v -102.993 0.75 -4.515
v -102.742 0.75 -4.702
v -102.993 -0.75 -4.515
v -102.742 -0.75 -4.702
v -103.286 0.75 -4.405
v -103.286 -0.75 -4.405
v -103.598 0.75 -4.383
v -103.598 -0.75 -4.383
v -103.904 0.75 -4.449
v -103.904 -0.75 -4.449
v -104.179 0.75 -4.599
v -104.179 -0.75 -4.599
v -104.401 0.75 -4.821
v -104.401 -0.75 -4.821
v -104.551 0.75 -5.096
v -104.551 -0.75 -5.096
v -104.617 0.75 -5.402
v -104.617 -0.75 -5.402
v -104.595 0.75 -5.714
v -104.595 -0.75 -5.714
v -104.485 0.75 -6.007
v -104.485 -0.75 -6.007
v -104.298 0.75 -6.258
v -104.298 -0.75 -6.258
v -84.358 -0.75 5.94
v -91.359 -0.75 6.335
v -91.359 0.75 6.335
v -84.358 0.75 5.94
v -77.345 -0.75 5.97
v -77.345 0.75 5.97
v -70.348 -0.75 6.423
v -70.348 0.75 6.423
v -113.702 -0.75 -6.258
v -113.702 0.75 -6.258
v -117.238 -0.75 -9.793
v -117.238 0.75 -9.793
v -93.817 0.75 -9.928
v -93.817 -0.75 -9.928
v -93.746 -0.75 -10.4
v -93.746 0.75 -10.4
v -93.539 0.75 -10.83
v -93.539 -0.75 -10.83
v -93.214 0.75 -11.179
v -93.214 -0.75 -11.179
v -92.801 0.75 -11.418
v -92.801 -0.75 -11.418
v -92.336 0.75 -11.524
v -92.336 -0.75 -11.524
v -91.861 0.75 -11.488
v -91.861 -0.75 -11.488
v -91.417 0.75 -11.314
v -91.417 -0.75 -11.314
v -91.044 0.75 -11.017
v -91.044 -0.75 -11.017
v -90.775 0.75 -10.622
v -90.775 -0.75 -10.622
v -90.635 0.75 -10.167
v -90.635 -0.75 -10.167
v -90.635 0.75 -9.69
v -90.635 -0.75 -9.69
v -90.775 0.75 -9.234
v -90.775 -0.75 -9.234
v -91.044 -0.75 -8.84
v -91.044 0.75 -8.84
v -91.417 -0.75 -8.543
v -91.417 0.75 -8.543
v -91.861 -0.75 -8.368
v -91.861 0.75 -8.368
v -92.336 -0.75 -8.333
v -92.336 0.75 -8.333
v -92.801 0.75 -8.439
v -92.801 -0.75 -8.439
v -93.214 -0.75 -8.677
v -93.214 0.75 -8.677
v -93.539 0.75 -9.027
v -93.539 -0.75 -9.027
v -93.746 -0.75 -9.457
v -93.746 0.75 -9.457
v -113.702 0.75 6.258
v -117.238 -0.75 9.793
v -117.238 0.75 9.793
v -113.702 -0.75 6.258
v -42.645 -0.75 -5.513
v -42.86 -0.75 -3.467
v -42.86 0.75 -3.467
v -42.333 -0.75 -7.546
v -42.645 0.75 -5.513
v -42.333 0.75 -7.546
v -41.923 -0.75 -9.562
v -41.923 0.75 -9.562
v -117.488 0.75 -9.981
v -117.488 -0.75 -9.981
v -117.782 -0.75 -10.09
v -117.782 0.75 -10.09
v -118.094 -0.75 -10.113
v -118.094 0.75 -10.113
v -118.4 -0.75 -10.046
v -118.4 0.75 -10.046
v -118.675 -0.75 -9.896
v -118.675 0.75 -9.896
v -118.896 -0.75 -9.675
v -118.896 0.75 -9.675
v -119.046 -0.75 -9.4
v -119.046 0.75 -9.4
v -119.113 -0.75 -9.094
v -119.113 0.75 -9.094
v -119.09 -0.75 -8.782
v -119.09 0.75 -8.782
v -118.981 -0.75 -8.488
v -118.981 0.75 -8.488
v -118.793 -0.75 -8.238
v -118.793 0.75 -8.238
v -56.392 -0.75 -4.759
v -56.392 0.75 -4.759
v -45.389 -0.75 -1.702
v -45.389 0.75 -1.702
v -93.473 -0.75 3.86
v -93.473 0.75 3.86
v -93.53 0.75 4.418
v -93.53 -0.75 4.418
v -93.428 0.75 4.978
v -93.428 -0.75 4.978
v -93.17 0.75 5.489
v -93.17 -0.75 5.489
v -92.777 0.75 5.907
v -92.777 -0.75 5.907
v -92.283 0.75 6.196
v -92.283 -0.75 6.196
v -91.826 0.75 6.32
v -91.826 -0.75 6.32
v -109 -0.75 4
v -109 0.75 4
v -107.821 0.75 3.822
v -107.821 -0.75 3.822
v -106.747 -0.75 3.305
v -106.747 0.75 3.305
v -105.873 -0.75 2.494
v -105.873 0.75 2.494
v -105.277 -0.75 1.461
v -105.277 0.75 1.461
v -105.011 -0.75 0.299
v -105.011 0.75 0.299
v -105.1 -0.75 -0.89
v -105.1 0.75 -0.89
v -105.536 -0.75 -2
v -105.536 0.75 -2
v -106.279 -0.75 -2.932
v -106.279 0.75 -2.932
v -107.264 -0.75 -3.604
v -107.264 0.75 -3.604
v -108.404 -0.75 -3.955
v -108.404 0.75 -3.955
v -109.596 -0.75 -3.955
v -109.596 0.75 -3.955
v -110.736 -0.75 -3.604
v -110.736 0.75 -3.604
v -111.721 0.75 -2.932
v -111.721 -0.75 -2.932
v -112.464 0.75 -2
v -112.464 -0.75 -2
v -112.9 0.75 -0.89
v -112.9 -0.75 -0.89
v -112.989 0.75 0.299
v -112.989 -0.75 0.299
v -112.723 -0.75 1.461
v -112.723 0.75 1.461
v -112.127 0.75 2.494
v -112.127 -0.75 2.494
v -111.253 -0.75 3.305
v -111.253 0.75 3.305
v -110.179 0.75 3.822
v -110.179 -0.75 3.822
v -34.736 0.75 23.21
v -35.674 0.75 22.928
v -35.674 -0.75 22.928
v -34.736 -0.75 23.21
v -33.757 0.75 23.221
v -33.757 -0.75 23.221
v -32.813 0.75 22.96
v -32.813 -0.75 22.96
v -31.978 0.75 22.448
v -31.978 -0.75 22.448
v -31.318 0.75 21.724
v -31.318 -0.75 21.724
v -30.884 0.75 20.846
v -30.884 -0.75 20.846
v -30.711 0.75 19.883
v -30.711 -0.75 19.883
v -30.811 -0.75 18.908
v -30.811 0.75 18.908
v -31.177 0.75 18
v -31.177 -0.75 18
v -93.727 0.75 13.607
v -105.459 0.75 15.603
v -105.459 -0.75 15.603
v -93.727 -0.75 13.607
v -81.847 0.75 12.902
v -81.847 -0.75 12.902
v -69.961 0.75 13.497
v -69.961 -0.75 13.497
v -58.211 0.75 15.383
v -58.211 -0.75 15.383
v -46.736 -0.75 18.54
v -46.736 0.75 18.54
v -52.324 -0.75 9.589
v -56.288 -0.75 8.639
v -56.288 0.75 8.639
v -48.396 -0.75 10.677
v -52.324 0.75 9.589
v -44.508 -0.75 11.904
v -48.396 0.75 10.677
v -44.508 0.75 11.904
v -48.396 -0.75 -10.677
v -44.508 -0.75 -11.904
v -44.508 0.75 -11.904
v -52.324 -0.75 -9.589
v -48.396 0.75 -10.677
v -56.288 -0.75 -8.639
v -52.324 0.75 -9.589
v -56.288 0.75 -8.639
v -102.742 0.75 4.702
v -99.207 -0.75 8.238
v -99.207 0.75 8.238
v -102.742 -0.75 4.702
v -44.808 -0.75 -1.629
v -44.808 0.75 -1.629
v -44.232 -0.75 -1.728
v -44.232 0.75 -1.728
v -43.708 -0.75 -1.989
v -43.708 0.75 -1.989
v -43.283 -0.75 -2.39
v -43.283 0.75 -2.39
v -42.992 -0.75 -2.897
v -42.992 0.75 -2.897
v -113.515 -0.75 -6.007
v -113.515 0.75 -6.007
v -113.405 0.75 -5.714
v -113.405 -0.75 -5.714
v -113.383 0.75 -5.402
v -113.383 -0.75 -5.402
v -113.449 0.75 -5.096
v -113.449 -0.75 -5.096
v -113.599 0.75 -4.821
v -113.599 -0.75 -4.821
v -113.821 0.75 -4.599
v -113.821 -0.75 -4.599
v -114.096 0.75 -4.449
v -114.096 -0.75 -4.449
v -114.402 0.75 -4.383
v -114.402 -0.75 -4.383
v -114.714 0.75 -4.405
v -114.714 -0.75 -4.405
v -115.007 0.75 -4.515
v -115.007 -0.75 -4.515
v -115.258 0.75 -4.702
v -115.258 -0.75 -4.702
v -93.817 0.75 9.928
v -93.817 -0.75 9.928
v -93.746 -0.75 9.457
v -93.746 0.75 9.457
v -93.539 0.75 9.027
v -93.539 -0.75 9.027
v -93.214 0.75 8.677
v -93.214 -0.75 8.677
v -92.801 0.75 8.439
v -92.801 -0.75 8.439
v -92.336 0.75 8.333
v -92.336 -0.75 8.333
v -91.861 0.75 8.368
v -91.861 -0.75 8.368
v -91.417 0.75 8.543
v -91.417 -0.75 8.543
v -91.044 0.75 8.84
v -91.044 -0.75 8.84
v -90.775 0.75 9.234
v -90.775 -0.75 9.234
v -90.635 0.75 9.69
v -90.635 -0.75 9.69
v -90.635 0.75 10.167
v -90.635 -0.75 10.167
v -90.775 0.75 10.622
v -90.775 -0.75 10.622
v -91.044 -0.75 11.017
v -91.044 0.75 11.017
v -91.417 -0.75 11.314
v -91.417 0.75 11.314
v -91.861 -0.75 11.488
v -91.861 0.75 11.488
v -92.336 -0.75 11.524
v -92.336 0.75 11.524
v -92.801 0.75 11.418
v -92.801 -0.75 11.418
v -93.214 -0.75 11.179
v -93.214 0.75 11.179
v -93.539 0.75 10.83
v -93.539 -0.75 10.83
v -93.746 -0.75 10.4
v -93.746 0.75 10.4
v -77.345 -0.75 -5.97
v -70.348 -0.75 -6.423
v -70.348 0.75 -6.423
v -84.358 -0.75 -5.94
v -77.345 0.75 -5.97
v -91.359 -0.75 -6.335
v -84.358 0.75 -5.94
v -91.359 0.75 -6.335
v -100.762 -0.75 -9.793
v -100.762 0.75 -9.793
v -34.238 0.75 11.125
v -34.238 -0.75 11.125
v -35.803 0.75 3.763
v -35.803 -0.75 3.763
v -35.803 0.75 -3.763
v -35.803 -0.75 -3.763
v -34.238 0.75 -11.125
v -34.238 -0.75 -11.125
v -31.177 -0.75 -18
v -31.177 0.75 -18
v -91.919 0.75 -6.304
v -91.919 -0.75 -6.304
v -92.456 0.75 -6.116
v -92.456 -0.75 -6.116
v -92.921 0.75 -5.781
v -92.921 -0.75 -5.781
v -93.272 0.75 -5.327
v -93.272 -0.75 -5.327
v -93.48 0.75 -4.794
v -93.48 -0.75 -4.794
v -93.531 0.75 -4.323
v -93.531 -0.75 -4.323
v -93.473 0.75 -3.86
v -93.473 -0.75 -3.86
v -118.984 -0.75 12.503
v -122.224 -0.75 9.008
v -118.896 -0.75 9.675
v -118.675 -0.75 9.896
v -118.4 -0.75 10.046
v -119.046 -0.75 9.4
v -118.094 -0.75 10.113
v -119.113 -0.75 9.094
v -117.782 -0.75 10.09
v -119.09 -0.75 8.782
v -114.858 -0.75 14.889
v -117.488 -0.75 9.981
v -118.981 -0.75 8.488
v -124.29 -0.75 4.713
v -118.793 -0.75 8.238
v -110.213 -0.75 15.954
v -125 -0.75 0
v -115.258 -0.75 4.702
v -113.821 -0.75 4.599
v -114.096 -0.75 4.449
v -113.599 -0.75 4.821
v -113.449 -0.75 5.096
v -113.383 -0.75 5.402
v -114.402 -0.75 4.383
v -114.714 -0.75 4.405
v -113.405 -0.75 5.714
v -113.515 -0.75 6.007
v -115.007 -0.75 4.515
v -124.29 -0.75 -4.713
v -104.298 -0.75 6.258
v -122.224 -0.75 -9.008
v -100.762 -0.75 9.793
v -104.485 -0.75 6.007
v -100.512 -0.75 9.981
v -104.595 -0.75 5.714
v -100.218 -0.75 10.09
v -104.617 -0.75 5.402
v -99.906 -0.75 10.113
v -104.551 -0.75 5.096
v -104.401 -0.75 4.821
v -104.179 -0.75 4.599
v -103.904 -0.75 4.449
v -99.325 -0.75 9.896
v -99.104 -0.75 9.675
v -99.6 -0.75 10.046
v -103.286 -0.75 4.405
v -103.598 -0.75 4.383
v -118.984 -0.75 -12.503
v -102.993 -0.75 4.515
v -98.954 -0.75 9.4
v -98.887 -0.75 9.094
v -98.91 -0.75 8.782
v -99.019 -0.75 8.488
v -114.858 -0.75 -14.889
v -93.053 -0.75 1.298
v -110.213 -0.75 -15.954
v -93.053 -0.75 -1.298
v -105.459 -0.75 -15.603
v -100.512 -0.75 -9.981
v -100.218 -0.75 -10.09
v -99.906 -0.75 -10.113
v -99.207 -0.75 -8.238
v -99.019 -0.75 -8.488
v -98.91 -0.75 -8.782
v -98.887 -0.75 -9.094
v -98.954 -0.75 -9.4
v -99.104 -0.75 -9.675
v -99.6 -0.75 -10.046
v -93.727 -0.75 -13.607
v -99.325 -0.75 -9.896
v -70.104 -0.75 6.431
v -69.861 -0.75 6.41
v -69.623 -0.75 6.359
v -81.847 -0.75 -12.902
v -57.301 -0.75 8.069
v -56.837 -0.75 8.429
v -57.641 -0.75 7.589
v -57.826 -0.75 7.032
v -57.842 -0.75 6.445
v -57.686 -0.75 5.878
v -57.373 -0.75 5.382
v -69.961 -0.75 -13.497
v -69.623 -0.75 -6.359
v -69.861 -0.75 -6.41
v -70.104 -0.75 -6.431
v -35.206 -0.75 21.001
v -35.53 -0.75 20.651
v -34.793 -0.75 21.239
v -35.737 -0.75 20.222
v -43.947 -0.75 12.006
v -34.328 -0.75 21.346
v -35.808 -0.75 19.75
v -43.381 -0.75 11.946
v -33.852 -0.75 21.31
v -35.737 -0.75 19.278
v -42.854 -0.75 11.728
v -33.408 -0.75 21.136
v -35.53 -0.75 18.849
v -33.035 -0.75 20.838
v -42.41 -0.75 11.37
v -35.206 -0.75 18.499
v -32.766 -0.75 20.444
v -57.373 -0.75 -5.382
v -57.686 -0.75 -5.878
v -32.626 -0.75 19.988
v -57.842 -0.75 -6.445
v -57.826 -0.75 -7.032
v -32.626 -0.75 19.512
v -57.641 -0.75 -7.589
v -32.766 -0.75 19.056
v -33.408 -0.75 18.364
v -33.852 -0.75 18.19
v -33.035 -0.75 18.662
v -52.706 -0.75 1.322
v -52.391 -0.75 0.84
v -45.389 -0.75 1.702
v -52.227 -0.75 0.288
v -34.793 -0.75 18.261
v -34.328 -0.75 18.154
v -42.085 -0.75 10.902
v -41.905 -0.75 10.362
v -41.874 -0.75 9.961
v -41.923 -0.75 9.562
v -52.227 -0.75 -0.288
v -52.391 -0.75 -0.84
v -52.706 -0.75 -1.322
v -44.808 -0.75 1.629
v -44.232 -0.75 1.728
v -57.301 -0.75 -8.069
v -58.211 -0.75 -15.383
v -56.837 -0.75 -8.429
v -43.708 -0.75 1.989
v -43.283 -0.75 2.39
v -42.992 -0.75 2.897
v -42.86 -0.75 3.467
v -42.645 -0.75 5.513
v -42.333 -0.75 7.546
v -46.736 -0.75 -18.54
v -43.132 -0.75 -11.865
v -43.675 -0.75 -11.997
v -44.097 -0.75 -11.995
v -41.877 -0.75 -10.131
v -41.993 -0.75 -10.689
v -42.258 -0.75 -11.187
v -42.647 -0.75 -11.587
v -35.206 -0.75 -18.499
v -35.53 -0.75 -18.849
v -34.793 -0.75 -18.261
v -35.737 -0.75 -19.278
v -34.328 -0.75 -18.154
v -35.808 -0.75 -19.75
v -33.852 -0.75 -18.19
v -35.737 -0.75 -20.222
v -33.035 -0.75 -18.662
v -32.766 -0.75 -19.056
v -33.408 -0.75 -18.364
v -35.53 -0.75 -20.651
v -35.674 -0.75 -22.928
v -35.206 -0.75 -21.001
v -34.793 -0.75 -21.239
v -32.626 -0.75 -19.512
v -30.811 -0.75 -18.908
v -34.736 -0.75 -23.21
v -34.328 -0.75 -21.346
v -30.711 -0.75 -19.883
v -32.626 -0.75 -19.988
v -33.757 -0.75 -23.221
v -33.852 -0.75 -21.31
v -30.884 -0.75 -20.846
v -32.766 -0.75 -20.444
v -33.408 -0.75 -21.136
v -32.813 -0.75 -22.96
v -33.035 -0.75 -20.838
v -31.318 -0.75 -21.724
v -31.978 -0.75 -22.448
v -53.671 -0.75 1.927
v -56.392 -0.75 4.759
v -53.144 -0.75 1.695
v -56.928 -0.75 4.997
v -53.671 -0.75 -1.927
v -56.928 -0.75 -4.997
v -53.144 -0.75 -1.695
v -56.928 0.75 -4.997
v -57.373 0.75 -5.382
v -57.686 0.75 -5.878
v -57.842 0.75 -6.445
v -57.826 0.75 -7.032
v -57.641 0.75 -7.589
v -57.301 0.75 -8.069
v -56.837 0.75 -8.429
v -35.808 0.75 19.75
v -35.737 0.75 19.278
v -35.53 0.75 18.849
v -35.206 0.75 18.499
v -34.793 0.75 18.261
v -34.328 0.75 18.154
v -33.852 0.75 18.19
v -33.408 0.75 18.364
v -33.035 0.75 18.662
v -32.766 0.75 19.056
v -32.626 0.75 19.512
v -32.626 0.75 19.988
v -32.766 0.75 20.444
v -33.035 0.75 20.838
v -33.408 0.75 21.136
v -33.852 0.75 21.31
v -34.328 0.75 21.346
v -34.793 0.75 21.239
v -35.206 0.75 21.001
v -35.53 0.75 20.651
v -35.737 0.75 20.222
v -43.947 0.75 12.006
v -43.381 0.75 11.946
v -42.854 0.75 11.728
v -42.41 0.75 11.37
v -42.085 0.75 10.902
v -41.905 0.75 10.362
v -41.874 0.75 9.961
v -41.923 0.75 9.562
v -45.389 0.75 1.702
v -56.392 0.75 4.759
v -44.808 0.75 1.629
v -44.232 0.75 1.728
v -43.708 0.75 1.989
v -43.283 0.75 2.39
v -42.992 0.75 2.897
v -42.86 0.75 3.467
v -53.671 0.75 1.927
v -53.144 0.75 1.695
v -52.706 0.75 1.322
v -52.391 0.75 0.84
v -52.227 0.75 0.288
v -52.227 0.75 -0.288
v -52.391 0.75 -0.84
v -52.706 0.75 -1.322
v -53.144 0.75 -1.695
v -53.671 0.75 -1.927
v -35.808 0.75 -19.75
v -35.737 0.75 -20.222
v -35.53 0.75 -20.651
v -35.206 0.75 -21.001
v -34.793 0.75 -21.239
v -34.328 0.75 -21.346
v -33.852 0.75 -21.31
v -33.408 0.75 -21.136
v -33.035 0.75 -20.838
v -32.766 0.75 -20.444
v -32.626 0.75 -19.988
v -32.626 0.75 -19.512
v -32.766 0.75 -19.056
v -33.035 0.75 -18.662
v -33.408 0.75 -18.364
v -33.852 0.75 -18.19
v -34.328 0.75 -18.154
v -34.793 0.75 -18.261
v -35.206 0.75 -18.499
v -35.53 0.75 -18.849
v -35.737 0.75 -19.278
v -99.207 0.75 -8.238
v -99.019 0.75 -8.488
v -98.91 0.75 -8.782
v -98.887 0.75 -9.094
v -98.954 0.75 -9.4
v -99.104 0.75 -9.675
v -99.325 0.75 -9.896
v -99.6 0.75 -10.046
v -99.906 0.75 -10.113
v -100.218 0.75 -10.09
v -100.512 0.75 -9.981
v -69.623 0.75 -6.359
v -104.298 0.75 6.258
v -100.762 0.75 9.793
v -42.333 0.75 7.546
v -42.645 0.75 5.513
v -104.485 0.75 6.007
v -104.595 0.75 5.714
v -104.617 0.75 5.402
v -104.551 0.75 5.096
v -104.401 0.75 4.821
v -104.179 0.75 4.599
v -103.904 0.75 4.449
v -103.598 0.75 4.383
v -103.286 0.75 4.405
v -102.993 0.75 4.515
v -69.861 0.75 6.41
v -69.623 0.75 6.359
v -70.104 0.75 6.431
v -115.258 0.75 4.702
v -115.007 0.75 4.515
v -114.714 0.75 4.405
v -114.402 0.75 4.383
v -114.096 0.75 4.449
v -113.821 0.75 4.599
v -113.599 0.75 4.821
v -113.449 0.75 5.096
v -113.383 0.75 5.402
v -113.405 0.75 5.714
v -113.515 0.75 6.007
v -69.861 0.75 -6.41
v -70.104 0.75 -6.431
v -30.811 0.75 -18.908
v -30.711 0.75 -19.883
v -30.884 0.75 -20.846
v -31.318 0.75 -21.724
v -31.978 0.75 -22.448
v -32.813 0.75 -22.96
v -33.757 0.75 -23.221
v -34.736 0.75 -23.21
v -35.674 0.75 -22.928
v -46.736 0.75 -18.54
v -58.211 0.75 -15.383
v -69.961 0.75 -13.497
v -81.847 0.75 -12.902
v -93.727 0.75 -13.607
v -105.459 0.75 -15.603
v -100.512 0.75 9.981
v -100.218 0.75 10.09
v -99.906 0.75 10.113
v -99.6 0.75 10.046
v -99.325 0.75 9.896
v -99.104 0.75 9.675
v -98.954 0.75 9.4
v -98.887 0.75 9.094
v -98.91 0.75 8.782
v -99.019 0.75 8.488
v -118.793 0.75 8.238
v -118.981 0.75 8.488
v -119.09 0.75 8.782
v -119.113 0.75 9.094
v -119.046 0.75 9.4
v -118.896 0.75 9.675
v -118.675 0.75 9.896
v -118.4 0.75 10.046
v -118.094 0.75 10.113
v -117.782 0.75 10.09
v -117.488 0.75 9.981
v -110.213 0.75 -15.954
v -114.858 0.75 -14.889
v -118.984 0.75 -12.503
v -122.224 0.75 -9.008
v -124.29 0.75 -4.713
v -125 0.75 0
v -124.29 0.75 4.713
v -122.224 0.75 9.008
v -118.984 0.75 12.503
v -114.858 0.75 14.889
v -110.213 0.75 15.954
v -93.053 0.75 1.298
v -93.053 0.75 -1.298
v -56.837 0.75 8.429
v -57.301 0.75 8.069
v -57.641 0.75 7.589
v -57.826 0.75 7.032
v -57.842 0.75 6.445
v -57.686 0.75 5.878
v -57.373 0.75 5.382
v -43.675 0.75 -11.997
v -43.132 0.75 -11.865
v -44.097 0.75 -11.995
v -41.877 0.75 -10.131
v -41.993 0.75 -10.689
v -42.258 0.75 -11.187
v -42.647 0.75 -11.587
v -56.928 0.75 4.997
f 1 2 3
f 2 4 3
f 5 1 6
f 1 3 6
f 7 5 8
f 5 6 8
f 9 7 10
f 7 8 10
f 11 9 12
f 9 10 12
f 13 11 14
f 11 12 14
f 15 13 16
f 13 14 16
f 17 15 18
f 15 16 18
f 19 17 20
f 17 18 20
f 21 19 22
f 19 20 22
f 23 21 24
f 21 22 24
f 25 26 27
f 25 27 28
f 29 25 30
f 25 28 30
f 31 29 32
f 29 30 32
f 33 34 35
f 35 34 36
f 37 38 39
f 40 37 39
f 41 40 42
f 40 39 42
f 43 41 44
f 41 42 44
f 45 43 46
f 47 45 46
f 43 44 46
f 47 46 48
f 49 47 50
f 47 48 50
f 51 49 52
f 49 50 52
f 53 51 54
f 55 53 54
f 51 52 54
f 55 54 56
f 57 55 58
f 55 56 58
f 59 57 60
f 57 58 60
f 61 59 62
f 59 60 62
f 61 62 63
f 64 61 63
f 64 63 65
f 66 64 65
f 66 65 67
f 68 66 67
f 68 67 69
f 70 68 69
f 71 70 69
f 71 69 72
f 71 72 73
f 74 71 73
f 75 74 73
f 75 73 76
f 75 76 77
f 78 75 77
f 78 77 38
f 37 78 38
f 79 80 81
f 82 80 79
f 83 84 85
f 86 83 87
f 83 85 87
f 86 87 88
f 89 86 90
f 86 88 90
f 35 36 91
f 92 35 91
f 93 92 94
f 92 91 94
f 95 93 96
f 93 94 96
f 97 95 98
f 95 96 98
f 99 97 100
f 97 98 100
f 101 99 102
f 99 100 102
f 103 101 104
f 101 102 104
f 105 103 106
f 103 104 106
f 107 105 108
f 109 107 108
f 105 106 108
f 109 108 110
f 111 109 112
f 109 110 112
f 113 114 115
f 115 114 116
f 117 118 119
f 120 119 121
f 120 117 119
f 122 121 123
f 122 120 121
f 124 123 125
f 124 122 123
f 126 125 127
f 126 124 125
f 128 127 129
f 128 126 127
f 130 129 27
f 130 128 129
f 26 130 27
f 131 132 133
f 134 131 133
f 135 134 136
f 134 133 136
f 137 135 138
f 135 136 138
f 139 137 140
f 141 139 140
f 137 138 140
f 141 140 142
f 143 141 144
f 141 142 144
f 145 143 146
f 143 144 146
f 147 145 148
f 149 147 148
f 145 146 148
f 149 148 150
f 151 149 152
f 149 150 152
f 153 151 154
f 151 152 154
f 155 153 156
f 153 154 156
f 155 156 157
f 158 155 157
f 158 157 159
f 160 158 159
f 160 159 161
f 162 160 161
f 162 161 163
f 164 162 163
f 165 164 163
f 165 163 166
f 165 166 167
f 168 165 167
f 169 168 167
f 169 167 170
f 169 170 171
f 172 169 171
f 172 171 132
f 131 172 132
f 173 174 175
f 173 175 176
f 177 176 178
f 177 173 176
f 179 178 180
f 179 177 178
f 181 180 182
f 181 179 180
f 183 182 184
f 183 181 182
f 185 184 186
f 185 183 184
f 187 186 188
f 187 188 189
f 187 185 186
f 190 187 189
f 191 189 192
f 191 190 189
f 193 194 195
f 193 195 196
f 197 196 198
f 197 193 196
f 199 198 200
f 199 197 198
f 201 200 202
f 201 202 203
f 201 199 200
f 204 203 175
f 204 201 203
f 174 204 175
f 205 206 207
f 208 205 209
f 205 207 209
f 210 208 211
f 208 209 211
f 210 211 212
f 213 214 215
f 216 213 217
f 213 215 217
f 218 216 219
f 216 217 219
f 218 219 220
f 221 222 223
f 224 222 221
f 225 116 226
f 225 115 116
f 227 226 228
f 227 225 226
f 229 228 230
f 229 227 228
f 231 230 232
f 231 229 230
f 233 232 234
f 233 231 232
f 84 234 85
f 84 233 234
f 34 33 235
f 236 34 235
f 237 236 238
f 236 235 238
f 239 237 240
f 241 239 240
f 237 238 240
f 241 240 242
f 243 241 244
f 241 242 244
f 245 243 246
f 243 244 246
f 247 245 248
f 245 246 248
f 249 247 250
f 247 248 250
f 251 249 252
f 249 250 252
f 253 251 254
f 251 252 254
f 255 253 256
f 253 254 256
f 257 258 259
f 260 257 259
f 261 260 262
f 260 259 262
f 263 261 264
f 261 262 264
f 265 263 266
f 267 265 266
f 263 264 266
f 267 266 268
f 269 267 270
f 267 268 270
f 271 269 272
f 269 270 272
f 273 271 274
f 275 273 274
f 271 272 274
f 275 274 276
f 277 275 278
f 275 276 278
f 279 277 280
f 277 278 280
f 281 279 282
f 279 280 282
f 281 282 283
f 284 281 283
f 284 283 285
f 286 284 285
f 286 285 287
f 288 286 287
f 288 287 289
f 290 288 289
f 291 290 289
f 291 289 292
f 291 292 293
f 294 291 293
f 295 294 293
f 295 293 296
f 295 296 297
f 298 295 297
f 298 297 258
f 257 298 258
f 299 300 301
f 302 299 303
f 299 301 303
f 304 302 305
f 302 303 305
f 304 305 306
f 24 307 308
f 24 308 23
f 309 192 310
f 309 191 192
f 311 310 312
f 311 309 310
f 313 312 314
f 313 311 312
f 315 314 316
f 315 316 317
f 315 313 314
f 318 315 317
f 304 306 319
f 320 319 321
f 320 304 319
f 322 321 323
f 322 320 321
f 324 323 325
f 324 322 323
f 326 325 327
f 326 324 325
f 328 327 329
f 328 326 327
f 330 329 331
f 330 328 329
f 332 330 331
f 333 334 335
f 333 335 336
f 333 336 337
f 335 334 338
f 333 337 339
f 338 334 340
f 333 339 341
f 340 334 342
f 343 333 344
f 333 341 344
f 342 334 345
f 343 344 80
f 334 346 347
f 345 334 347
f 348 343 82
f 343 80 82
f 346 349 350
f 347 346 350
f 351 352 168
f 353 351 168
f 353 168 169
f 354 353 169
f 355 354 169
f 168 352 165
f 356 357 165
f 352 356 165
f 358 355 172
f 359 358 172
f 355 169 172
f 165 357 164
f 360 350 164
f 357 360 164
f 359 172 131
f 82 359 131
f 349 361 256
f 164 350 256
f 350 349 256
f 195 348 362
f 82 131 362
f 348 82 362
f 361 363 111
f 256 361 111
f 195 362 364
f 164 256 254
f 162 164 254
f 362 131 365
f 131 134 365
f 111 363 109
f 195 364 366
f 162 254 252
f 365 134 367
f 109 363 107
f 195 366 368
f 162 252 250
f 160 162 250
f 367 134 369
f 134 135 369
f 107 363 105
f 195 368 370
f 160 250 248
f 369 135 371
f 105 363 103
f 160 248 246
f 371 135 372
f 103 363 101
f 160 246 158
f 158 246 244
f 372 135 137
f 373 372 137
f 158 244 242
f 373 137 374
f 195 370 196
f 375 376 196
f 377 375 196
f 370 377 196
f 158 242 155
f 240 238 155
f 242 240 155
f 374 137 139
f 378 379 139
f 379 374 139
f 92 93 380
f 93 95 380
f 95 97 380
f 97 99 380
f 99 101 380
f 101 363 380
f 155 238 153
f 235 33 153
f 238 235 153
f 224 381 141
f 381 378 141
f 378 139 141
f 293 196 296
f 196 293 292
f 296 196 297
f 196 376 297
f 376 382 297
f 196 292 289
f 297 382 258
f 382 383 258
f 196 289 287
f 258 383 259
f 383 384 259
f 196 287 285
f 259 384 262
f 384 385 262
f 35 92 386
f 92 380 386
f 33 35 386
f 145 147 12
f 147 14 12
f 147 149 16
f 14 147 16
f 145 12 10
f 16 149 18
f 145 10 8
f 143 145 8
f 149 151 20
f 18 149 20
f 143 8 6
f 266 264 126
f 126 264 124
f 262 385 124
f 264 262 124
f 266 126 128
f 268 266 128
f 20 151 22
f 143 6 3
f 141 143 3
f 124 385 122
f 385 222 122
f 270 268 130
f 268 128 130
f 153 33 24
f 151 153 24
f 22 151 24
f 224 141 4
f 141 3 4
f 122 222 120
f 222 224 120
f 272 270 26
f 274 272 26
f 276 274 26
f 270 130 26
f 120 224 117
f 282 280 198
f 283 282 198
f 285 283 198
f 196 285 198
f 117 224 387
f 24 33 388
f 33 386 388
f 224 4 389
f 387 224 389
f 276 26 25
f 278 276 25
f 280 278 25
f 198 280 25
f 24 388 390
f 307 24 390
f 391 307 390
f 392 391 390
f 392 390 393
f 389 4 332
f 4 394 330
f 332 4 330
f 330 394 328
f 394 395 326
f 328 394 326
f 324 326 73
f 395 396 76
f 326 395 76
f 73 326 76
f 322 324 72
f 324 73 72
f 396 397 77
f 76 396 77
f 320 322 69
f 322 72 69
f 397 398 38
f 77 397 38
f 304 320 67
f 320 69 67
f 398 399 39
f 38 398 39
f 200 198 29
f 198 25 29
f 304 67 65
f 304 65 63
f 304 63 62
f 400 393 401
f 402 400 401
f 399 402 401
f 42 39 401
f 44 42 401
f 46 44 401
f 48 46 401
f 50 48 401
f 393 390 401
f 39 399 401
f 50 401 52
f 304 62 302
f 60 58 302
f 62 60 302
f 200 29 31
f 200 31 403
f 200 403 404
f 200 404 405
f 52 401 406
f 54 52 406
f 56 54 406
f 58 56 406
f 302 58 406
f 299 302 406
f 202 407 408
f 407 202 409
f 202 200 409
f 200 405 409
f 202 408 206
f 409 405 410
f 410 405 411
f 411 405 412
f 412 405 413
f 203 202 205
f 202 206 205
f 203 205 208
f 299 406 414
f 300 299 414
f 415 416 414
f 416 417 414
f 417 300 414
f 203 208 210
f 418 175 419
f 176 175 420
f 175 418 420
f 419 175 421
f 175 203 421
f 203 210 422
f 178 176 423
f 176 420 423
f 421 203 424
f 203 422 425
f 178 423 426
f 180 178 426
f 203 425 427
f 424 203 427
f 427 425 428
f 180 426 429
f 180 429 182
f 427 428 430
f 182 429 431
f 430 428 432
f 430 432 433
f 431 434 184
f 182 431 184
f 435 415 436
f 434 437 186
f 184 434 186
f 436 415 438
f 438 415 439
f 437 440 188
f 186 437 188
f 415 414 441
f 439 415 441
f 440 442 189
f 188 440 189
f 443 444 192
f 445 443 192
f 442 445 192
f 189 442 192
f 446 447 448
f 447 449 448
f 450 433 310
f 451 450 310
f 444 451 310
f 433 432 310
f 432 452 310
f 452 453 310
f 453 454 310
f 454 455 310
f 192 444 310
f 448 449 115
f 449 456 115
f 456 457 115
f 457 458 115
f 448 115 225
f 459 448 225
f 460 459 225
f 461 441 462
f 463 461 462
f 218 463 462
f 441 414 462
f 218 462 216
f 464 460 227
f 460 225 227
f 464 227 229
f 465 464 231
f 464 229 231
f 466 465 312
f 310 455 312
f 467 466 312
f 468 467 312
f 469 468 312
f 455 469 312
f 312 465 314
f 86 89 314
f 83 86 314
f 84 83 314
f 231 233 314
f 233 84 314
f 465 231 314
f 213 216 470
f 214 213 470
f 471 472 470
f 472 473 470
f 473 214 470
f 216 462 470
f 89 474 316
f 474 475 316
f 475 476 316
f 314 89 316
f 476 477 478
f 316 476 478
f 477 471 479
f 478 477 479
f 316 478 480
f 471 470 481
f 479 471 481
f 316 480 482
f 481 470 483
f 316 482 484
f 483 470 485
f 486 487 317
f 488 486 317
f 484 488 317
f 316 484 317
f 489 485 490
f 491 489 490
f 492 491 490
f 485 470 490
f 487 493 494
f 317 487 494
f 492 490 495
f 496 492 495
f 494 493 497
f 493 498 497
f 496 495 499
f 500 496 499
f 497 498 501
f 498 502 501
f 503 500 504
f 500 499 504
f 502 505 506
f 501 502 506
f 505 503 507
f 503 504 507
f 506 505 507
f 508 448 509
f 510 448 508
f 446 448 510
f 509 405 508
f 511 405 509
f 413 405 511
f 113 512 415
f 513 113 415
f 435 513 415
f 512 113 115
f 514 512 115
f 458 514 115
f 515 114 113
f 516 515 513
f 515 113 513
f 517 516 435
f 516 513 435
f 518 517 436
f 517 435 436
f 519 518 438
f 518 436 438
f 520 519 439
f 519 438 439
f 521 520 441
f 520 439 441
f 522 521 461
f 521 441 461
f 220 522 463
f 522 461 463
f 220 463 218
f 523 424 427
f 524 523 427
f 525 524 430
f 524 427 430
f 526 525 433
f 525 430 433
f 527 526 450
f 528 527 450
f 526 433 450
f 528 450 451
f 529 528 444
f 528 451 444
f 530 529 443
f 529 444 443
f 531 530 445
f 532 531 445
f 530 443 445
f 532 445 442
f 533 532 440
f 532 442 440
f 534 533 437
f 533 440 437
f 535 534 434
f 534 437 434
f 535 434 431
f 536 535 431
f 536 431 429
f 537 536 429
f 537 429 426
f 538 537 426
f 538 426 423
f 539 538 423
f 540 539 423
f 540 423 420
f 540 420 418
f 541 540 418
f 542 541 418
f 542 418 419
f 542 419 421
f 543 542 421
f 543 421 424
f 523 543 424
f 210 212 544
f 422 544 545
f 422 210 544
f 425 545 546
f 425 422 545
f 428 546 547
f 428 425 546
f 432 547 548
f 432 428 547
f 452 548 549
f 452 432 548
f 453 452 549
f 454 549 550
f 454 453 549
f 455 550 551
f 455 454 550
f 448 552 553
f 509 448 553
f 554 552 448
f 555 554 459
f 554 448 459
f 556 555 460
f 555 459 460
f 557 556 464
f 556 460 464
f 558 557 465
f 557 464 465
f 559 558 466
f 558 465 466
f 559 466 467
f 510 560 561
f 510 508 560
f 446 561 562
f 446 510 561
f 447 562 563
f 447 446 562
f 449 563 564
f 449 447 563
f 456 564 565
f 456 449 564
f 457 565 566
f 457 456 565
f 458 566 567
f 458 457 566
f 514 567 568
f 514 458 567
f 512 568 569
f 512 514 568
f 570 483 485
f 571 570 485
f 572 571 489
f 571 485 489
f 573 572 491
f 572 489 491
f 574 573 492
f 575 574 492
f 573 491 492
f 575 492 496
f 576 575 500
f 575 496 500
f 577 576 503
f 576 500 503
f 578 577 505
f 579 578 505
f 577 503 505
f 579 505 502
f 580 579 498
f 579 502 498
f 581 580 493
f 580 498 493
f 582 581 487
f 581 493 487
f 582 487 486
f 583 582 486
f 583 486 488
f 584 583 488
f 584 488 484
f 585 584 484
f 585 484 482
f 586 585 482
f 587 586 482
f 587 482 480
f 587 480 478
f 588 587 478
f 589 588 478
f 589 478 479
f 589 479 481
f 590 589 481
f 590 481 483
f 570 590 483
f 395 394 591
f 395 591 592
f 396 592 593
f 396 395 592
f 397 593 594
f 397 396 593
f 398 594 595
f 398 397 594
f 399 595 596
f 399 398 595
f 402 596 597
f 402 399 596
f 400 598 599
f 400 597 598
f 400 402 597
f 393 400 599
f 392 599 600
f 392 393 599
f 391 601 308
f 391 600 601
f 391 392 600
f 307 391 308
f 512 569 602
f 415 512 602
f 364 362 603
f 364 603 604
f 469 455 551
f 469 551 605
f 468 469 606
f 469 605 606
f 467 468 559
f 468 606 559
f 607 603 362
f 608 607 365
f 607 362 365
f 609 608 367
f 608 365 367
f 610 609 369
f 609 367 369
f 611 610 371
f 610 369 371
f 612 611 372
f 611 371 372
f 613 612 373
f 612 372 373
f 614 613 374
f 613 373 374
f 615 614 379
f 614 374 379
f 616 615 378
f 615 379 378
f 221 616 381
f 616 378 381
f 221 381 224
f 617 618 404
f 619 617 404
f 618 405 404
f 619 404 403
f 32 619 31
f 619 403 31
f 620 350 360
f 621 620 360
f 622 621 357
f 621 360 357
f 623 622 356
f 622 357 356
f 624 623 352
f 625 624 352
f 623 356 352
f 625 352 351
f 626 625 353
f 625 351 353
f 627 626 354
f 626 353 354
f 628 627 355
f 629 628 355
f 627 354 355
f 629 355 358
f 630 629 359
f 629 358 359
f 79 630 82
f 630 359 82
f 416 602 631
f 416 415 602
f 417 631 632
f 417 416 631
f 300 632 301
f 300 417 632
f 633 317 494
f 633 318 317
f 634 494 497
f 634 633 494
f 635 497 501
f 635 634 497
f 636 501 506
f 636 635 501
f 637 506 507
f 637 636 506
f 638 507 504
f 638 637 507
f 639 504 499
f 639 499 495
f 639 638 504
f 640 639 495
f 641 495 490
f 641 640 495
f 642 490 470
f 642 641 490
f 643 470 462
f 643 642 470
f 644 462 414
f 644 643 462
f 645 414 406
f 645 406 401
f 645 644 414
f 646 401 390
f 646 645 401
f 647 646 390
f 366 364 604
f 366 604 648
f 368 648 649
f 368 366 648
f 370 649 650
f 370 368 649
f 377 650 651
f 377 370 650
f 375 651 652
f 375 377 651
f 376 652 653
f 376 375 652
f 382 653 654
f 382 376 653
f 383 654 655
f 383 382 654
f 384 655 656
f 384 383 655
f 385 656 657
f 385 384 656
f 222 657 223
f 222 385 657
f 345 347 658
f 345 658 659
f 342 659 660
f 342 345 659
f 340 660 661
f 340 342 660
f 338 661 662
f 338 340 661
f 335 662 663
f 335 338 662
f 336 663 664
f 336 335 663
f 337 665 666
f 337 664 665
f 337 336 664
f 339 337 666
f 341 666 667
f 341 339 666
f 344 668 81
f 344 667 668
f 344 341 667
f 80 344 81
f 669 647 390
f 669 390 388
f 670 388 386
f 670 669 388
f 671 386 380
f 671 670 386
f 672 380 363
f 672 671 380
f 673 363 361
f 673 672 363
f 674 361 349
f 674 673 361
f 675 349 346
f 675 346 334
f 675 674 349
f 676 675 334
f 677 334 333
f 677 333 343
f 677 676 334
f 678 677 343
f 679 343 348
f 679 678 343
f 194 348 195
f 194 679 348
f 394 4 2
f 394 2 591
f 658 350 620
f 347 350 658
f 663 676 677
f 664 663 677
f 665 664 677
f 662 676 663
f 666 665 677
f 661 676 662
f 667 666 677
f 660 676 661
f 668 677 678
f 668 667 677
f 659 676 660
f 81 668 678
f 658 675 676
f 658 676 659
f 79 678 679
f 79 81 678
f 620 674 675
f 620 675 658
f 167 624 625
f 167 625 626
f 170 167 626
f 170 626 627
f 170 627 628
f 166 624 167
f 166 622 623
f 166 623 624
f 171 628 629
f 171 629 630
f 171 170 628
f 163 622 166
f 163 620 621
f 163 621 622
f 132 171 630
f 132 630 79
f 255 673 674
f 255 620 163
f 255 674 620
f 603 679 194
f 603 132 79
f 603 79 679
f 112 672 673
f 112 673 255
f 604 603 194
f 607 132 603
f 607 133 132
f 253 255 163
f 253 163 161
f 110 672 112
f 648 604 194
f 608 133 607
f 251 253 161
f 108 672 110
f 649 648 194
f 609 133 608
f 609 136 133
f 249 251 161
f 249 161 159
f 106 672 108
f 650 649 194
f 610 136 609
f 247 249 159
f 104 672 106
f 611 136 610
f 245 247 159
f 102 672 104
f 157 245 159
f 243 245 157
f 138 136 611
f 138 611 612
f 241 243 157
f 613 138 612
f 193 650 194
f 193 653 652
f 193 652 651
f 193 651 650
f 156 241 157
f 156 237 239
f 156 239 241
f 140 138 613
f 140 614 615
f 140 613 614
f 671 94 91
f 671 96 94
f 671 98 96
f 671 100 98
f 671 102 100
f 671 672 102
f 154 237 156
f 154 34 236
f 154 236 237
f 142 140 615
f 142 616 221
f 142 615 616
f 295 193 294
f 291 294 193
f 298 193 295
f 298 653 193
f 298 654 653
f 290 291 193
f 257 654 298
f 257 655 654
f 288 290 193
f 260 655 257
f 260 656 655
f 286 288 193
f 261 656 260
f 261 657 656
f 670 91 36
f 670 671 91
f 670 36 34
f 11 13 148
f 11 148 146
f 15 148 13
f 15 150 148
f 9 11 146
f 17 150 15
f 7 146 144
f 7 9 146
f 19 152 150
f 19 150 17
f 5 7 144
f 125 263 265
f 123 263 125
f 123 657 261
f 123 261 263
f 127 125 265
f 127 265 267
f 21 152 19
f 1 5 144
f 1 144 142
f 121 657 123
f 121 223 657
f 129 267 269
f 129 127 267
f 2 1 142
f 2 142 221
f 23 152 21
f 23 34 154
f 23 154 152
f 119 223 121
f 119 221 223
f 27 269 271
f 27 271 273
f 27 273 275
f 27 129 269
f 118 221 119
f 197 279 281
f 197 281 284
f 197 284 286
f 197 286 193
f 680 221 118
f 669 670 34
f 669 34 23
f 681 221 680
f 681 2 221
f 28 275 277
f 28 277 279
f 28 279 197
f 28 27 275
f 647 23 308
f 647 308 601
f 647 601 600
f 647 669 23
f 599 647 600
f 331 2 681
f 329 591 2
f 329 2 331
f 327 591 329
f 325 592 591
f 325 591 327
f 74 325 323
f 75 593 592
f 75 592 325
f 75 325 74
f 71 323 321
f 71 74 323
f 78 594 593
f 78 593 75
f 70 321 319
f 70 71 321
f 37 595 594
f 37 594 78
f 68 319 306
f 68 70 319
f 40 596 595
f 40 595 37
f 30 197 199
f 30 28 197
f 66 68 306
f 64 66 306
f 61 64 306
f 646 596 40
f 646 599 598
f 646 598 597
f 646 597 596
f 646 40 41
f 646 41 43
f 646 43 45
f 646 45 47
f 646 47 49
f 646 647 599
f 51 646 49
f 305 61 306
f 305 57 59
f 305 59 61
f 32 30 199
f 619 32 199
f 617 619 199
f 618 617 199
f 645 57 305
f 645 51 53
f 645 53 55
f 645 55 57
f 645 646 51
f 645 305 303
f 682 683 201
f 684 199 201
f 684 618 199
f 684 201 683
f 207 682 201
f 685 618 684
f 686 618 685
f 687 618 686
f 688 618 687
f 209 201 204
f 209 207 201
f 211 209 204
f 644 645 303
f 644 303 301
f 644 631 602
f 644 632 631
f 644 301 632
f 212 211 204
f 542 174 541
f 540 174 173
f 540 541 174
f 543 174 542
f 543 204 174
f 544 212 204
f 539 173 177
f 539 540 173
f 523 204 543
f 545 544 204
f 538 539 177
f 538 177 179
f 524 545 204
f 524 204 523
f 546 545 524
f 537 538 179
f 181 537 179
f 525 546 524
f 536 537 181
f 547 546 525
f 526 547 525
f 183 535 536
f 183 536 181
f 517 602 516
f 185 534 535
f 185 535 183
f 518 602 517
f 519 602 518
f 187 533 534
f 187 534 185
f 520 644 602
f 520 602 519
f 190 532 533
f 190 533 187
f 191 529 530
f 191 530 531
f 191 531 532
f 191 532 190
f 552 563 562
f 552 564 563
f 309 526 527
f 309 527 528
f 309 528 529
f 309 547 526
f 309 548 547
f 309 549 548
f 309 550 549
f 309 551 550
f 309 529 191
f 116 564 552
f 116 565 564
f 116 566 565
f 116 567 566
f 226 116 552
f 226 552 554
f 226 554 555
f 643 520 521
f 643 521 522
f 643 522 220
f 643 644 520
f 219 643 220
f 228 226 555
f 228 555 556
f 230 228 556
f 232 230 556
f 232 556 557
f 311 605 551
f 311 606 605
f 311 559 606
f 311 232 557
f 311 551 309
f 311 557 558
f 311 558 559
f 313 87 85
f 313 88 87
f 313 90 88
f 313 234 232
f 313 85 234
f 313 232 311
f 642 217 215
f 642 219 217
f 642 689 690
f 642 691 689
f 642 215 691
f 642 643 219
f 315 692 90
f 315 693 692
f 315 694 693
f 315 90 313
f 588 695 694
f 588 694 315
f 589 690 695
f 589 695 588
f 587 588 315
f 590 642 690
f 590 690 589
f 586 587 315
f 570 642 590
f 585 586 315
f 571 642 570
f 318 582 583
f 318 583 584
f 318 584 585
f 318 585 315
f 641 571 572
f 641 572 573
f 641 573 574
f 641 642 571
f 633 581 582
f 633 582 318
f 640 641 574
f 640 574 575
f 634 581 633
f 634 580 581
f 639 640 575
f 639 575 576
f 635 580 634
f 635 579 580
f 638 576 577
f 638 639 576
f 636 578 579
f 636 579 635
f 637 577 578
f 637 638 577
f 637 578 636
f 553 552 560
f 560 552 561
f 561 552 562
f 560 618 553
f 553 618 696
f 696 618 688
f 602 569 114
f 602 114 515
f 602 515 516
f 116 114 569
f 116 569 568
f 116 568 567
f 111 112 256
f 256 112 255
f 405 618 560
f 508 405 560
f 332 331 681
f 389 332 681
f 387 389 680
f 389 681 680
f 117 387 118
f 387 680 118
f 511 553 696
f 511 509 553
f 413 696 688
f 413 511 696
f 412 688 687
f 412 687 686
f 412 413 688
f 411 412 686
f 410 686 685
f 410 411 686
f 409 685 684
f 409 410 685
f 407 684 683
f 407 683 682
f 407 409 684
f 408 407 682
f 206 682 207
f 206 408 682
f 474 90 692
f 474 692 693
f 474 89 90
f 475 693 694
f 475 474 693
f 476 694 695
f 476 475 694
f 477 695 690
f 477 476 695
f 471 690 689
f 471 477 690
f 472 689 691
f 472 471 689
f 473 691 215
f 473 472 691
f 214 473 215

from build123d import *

# Parameters (mm, degrees)
SKETCH1_R                      = 3.5
BOSS_EXTRUDE1_DEPTH            = 0.75
F_2_2_2_2_DIAMETER_HOLE1_D     = 2.2
F_3_2_3_2_DIAMETER_HOLE1_D     = 3.2
F_3_2_3_2_DIAMETER_HOLE1_DEPTH = 10
F_3_2_3_2_DIAMETER_HOLE1_TIP   = 0.96137699
CUT_EXTRUDE1_DEPTH             = 128.152713302
FILLET1_R                      = 2
SKETCH7_R                      = 4
CUT_EXTRUDE2_DEPTH             = 128.15271342
CUT_EXTRUDE3_DEPTH             = 5


with BuildPart() as part:
    # Sketch1 → Boss-Extrude1 (new, symmetric)
    with BuildSketch(Plane(origin=(0, 0, 0), x_dir=(1, 0, 0), z_dir=(0, 1, 0))):
        with BuildLine():
            ThreePointArc((-37.239092363, -21.5), (-43, 0), (-37.239092363, 21.5))
            ThreePointArc((-37.239092363, 21.5), (-36.567343094, 22.335249783), (-35.674318722, 22.928037055))
            ThreePointArc((-35.674318722, 22.928037055), (-69.961373448, 13.496685886), (-105.45946442, 15.603352454))
            ThreePointArc((-105.45946442, 15.603352454), (-125, 0), (-105.45946442, -15.603352454))
            ThreePointArc((-105.45946442, -15.603352454), (-69.961373448, -13.496685886), (-35.674318722, -22.928037055))
            ThreePointArc((-35.674318722, -22.928037055), (-36.567343094, -22.335249783), (-37.239092363, -21.5))
        make_face()
        with BuildLine():
            ThreePointArc((-31.176914536, 18), (-35.958003449, 16.718911087), (-37.239092363, 21.5))
            ThreePointArc((-37.239092363, 21.5), (-43, 0), (-37.239092363, -21.5))
            ThreePointArc((-37.239092363, -21.5), (-35.958003449, -16.718911087), (-31.176914536, -18))
            ThreePointArc((-31.176914536, -18), (-36, 0), (-31.176914536, 18))
        make_face()
        with Locations((-34.208003449, -19.75)):
            Circle(SKETCH1_R)
        with Locations((-34.208003449, 19.75)):
            Circle(SKETCH1_R)
    extrude(amount=BOSS_EXTRUDE1_DEPTH, both=True)

    # Ø2.2 (2.2) Diameter Hole1 (through all)
    with Locations(Plane(origin=(0, 0.75, 0), x_dir=(1, 0, 0), z_dir=(0, 1, 0))):
        with Locations((-114.480077554, 5.480077554), (-103.519922446, 5.480077554), (-103.519922446, -5.480077554), (-114.480077554, -5.480077554)):
            Hole(F_2_2_2_2_DIAMETER_HOLE1_D / 2)

    # Ø3.2 (3.2) Diameter Hole1
    with Locations(Plane(origin=(0, 0.75, 0), x_dir=(1, 0, 0), z_dir=(0, 1, 0))):
        with Locations((-34.208003449, 19.75), (-34.208003449, -19.75), (-92.21668251, 9.928255337), (-92.21668251, -9.928255337)):
            Hole(F_3_2_3_2_DIAMETER_HOLE1_D / 2, depth=F_3_2_3_2_DIAMETER_HOLE1_DEPTH)
            with Locations((0, 0, -(F_3_2_3_2_DIAMETER_HOLE1_DEPTH + F_3_2_3_2_DIAMETER_HOLE1_TIP / 2))):  # 118° drill point
                Cone(0, F_3_2_3_2_DIAMETER_HOLE1_D / 2, F_3_2_3_2_DIAMETER_HOLE1_TIP, mode=Mode.SUBTRACT)

    # Sketch6 → Cut-Extrude1 (cut, through all)
    with BuildSketch(Plane(origin=(0, 0.75, 0), x_dir=(1, 0, 0), z_dir=(0, 1, 0))):
        with BuildLine():
            Line((-69.980899838, -6.458648161), (-46.735459102, 0))
            Line((-46.735459102, 0), (-69.980899838, 6.458648161))
            ThreePointArc((-69.980899838, 6.458648161), (-82.217649484, 5.904514504), (-94.444607799, 6.643836082))
            ThreePointArc((-94.444607799, 6.643836082), (-93, 0), (-94.444607799, -6.643836082))
            ThreePointArc((-94.444607799, -6.643836082), (-82.217649484, -5.904514504), (-69.980899838, -6.458648161))
        make_face()
        with BuildLine():
            Line((-64.779742297, 7.089291637), (-42.987555952, 1.03442411))
            ThreePointArc((-42.987555952, 1.03442411), (-42.397380289, 7.173712054), (-40.934970503, 13.165416435))
            ThreePointArc((-40.934970503, 13.165416435), (-52.695786799, 9.493300195), (-64.779742297, 7.089291637))
        make_face()
        with BuildLine():
            ThreePointArc((-40.934970503, -13.165416435), (-42.397380289, -7.173712054), (-42.987555952, -1.03442411))
            Line((-42.987555952, -1.03442411), (-64.779742297, -7.089291637))
            ThreePointArc((-64.779742297, -7.089291637), (-52.695786799, -9.493300195), (-40.934970503, -13.165416435))
        make_face()
    extrude(amount=-CUT_EXTRUDE1_DEPTH, mode=Mode.SUBTRACT)

    # Fillet1
    fillet1_edges = [part.edges().sort_by_distance(p)[0] for p in [
        (-42.987555952, 0, 1.03442411),
        (-40.934970503, 0, 13.165416435),
        (-64.779742297, 0, 7.089291637),
        (-94.444607799, 0, 6.643836082),
        (-94.444607799, 0, -6.643836082),
        (-69.980899838, 0, -6.458648161),
        (-46.735459102, 0, 0),
        (-69.980899838, 0, 6.458648161),
        (-40.934970503, 0, -13.165416435),
        (-42.987555952, 0, -1.03442411),
        (-64.779742297, 0, -7.089291637),
    ]]
    fillet(fillet1_edges, radius=FILLET1_R)

    # Sketch7 → Cut-Extrude2 (cut, through all)
    with BuildSketch(Plane(origin=(0, 0.75, 0), x_dir=(1, 0, 0), z_dir=(0, 1, 0))):
        with Locations(Location((-109, 0, 0), (0, 0, 270))):
            Circle(SKETCH7_R)
    extrude(amount=-CUT_EXTRUDE2_DEPTH, mode=Mode.SUBTRACT)

    # Sketch8 → Cut-Extrude3 (cut, symmetric)
    with BuildSketch(Plane(origin=(0, 0.75, 0), x_dir=(1, 0, 0), z_dir=(0, 1, 0))):
        with BuildLine():
            ThreePointArc((-99.206571081, 8.237794001), (-99.206571081, 9.793428919), (-100.762205999, 9.793428919))
            Line((-100.762205999, 9.793428919), (-104.297739905, 6.257895014))
            ThreePointArc((-104.297739905, 6.257895014), (-103.09897067, 6.49634504), (-102.419922446, 5.480077554))
            ThreePointArc((-102.419922446, 5.480077554), (-102.50365496, 5.059125779), (-102.742104986, 4.702260095))
            Line((-102.742104986, 4.702260095), (-99.206571081, 8.237794001))
        make_face()
        with BuildLine():
            ThreePointArc((-100.762205999, -9.793428919), (-99.206571081, -9.793428919), (-99.206571081, -8.237794001))
            Line((-99.206571081, -8.237794001), (-102.742104986, -4.702260095))
            ThreePointArc((-102.742104986, -4.702260095), (-102.50365496, -5.059125779), (-102.419922446, -5.480077554))
            ThreePointArc((-102.419922446, -5.480077554), (-103.09897067, -6.49634504), (-104.297739905, -6.257895014))
            Line((-104.297739905, -6.257895014), (-100.762205999, -9.793428919))
        make_face()
        with BuildLine():
            Line((-115.257895014, -4.702260095), (-118.793428919, -8.237794001))
            ThreePointArc((-118.793428919, -8.237794001), (-118.793428919, -9.793428919), (-117.237794001, -9.793428919))
            Line((-117.237794001, -9.793428919), (-113.702260095, -6.257895014))
            ThreePointArc((-113.702260095, -6.257895014), (-115.257895014, -6.257895014), (-115.257895014, -4.702260095))
        make_face()
        with BuildLine():
            Line((-113.702260095, 6.257895014), (-117.237794001, 9.793428919))
            ThreePointArc((-117.237794001, 9.793428919), (-118.793428919, 9.793428919), (-118.793428919, 8.237794001))
            Line((-118.793428919, 8.237794001), (-115.257895014, 4.702260095))
            ThreePointArc((-115.257895014, 4.702260095), (-115.257895014, 6.257895014), (-113.702260095, 6.257895014))
        make_face()
    extrude(amount=CUT_EXTRUDE3_DEPTH, both=True, mode=Mode.SUBTRACT)


solid = part.part
